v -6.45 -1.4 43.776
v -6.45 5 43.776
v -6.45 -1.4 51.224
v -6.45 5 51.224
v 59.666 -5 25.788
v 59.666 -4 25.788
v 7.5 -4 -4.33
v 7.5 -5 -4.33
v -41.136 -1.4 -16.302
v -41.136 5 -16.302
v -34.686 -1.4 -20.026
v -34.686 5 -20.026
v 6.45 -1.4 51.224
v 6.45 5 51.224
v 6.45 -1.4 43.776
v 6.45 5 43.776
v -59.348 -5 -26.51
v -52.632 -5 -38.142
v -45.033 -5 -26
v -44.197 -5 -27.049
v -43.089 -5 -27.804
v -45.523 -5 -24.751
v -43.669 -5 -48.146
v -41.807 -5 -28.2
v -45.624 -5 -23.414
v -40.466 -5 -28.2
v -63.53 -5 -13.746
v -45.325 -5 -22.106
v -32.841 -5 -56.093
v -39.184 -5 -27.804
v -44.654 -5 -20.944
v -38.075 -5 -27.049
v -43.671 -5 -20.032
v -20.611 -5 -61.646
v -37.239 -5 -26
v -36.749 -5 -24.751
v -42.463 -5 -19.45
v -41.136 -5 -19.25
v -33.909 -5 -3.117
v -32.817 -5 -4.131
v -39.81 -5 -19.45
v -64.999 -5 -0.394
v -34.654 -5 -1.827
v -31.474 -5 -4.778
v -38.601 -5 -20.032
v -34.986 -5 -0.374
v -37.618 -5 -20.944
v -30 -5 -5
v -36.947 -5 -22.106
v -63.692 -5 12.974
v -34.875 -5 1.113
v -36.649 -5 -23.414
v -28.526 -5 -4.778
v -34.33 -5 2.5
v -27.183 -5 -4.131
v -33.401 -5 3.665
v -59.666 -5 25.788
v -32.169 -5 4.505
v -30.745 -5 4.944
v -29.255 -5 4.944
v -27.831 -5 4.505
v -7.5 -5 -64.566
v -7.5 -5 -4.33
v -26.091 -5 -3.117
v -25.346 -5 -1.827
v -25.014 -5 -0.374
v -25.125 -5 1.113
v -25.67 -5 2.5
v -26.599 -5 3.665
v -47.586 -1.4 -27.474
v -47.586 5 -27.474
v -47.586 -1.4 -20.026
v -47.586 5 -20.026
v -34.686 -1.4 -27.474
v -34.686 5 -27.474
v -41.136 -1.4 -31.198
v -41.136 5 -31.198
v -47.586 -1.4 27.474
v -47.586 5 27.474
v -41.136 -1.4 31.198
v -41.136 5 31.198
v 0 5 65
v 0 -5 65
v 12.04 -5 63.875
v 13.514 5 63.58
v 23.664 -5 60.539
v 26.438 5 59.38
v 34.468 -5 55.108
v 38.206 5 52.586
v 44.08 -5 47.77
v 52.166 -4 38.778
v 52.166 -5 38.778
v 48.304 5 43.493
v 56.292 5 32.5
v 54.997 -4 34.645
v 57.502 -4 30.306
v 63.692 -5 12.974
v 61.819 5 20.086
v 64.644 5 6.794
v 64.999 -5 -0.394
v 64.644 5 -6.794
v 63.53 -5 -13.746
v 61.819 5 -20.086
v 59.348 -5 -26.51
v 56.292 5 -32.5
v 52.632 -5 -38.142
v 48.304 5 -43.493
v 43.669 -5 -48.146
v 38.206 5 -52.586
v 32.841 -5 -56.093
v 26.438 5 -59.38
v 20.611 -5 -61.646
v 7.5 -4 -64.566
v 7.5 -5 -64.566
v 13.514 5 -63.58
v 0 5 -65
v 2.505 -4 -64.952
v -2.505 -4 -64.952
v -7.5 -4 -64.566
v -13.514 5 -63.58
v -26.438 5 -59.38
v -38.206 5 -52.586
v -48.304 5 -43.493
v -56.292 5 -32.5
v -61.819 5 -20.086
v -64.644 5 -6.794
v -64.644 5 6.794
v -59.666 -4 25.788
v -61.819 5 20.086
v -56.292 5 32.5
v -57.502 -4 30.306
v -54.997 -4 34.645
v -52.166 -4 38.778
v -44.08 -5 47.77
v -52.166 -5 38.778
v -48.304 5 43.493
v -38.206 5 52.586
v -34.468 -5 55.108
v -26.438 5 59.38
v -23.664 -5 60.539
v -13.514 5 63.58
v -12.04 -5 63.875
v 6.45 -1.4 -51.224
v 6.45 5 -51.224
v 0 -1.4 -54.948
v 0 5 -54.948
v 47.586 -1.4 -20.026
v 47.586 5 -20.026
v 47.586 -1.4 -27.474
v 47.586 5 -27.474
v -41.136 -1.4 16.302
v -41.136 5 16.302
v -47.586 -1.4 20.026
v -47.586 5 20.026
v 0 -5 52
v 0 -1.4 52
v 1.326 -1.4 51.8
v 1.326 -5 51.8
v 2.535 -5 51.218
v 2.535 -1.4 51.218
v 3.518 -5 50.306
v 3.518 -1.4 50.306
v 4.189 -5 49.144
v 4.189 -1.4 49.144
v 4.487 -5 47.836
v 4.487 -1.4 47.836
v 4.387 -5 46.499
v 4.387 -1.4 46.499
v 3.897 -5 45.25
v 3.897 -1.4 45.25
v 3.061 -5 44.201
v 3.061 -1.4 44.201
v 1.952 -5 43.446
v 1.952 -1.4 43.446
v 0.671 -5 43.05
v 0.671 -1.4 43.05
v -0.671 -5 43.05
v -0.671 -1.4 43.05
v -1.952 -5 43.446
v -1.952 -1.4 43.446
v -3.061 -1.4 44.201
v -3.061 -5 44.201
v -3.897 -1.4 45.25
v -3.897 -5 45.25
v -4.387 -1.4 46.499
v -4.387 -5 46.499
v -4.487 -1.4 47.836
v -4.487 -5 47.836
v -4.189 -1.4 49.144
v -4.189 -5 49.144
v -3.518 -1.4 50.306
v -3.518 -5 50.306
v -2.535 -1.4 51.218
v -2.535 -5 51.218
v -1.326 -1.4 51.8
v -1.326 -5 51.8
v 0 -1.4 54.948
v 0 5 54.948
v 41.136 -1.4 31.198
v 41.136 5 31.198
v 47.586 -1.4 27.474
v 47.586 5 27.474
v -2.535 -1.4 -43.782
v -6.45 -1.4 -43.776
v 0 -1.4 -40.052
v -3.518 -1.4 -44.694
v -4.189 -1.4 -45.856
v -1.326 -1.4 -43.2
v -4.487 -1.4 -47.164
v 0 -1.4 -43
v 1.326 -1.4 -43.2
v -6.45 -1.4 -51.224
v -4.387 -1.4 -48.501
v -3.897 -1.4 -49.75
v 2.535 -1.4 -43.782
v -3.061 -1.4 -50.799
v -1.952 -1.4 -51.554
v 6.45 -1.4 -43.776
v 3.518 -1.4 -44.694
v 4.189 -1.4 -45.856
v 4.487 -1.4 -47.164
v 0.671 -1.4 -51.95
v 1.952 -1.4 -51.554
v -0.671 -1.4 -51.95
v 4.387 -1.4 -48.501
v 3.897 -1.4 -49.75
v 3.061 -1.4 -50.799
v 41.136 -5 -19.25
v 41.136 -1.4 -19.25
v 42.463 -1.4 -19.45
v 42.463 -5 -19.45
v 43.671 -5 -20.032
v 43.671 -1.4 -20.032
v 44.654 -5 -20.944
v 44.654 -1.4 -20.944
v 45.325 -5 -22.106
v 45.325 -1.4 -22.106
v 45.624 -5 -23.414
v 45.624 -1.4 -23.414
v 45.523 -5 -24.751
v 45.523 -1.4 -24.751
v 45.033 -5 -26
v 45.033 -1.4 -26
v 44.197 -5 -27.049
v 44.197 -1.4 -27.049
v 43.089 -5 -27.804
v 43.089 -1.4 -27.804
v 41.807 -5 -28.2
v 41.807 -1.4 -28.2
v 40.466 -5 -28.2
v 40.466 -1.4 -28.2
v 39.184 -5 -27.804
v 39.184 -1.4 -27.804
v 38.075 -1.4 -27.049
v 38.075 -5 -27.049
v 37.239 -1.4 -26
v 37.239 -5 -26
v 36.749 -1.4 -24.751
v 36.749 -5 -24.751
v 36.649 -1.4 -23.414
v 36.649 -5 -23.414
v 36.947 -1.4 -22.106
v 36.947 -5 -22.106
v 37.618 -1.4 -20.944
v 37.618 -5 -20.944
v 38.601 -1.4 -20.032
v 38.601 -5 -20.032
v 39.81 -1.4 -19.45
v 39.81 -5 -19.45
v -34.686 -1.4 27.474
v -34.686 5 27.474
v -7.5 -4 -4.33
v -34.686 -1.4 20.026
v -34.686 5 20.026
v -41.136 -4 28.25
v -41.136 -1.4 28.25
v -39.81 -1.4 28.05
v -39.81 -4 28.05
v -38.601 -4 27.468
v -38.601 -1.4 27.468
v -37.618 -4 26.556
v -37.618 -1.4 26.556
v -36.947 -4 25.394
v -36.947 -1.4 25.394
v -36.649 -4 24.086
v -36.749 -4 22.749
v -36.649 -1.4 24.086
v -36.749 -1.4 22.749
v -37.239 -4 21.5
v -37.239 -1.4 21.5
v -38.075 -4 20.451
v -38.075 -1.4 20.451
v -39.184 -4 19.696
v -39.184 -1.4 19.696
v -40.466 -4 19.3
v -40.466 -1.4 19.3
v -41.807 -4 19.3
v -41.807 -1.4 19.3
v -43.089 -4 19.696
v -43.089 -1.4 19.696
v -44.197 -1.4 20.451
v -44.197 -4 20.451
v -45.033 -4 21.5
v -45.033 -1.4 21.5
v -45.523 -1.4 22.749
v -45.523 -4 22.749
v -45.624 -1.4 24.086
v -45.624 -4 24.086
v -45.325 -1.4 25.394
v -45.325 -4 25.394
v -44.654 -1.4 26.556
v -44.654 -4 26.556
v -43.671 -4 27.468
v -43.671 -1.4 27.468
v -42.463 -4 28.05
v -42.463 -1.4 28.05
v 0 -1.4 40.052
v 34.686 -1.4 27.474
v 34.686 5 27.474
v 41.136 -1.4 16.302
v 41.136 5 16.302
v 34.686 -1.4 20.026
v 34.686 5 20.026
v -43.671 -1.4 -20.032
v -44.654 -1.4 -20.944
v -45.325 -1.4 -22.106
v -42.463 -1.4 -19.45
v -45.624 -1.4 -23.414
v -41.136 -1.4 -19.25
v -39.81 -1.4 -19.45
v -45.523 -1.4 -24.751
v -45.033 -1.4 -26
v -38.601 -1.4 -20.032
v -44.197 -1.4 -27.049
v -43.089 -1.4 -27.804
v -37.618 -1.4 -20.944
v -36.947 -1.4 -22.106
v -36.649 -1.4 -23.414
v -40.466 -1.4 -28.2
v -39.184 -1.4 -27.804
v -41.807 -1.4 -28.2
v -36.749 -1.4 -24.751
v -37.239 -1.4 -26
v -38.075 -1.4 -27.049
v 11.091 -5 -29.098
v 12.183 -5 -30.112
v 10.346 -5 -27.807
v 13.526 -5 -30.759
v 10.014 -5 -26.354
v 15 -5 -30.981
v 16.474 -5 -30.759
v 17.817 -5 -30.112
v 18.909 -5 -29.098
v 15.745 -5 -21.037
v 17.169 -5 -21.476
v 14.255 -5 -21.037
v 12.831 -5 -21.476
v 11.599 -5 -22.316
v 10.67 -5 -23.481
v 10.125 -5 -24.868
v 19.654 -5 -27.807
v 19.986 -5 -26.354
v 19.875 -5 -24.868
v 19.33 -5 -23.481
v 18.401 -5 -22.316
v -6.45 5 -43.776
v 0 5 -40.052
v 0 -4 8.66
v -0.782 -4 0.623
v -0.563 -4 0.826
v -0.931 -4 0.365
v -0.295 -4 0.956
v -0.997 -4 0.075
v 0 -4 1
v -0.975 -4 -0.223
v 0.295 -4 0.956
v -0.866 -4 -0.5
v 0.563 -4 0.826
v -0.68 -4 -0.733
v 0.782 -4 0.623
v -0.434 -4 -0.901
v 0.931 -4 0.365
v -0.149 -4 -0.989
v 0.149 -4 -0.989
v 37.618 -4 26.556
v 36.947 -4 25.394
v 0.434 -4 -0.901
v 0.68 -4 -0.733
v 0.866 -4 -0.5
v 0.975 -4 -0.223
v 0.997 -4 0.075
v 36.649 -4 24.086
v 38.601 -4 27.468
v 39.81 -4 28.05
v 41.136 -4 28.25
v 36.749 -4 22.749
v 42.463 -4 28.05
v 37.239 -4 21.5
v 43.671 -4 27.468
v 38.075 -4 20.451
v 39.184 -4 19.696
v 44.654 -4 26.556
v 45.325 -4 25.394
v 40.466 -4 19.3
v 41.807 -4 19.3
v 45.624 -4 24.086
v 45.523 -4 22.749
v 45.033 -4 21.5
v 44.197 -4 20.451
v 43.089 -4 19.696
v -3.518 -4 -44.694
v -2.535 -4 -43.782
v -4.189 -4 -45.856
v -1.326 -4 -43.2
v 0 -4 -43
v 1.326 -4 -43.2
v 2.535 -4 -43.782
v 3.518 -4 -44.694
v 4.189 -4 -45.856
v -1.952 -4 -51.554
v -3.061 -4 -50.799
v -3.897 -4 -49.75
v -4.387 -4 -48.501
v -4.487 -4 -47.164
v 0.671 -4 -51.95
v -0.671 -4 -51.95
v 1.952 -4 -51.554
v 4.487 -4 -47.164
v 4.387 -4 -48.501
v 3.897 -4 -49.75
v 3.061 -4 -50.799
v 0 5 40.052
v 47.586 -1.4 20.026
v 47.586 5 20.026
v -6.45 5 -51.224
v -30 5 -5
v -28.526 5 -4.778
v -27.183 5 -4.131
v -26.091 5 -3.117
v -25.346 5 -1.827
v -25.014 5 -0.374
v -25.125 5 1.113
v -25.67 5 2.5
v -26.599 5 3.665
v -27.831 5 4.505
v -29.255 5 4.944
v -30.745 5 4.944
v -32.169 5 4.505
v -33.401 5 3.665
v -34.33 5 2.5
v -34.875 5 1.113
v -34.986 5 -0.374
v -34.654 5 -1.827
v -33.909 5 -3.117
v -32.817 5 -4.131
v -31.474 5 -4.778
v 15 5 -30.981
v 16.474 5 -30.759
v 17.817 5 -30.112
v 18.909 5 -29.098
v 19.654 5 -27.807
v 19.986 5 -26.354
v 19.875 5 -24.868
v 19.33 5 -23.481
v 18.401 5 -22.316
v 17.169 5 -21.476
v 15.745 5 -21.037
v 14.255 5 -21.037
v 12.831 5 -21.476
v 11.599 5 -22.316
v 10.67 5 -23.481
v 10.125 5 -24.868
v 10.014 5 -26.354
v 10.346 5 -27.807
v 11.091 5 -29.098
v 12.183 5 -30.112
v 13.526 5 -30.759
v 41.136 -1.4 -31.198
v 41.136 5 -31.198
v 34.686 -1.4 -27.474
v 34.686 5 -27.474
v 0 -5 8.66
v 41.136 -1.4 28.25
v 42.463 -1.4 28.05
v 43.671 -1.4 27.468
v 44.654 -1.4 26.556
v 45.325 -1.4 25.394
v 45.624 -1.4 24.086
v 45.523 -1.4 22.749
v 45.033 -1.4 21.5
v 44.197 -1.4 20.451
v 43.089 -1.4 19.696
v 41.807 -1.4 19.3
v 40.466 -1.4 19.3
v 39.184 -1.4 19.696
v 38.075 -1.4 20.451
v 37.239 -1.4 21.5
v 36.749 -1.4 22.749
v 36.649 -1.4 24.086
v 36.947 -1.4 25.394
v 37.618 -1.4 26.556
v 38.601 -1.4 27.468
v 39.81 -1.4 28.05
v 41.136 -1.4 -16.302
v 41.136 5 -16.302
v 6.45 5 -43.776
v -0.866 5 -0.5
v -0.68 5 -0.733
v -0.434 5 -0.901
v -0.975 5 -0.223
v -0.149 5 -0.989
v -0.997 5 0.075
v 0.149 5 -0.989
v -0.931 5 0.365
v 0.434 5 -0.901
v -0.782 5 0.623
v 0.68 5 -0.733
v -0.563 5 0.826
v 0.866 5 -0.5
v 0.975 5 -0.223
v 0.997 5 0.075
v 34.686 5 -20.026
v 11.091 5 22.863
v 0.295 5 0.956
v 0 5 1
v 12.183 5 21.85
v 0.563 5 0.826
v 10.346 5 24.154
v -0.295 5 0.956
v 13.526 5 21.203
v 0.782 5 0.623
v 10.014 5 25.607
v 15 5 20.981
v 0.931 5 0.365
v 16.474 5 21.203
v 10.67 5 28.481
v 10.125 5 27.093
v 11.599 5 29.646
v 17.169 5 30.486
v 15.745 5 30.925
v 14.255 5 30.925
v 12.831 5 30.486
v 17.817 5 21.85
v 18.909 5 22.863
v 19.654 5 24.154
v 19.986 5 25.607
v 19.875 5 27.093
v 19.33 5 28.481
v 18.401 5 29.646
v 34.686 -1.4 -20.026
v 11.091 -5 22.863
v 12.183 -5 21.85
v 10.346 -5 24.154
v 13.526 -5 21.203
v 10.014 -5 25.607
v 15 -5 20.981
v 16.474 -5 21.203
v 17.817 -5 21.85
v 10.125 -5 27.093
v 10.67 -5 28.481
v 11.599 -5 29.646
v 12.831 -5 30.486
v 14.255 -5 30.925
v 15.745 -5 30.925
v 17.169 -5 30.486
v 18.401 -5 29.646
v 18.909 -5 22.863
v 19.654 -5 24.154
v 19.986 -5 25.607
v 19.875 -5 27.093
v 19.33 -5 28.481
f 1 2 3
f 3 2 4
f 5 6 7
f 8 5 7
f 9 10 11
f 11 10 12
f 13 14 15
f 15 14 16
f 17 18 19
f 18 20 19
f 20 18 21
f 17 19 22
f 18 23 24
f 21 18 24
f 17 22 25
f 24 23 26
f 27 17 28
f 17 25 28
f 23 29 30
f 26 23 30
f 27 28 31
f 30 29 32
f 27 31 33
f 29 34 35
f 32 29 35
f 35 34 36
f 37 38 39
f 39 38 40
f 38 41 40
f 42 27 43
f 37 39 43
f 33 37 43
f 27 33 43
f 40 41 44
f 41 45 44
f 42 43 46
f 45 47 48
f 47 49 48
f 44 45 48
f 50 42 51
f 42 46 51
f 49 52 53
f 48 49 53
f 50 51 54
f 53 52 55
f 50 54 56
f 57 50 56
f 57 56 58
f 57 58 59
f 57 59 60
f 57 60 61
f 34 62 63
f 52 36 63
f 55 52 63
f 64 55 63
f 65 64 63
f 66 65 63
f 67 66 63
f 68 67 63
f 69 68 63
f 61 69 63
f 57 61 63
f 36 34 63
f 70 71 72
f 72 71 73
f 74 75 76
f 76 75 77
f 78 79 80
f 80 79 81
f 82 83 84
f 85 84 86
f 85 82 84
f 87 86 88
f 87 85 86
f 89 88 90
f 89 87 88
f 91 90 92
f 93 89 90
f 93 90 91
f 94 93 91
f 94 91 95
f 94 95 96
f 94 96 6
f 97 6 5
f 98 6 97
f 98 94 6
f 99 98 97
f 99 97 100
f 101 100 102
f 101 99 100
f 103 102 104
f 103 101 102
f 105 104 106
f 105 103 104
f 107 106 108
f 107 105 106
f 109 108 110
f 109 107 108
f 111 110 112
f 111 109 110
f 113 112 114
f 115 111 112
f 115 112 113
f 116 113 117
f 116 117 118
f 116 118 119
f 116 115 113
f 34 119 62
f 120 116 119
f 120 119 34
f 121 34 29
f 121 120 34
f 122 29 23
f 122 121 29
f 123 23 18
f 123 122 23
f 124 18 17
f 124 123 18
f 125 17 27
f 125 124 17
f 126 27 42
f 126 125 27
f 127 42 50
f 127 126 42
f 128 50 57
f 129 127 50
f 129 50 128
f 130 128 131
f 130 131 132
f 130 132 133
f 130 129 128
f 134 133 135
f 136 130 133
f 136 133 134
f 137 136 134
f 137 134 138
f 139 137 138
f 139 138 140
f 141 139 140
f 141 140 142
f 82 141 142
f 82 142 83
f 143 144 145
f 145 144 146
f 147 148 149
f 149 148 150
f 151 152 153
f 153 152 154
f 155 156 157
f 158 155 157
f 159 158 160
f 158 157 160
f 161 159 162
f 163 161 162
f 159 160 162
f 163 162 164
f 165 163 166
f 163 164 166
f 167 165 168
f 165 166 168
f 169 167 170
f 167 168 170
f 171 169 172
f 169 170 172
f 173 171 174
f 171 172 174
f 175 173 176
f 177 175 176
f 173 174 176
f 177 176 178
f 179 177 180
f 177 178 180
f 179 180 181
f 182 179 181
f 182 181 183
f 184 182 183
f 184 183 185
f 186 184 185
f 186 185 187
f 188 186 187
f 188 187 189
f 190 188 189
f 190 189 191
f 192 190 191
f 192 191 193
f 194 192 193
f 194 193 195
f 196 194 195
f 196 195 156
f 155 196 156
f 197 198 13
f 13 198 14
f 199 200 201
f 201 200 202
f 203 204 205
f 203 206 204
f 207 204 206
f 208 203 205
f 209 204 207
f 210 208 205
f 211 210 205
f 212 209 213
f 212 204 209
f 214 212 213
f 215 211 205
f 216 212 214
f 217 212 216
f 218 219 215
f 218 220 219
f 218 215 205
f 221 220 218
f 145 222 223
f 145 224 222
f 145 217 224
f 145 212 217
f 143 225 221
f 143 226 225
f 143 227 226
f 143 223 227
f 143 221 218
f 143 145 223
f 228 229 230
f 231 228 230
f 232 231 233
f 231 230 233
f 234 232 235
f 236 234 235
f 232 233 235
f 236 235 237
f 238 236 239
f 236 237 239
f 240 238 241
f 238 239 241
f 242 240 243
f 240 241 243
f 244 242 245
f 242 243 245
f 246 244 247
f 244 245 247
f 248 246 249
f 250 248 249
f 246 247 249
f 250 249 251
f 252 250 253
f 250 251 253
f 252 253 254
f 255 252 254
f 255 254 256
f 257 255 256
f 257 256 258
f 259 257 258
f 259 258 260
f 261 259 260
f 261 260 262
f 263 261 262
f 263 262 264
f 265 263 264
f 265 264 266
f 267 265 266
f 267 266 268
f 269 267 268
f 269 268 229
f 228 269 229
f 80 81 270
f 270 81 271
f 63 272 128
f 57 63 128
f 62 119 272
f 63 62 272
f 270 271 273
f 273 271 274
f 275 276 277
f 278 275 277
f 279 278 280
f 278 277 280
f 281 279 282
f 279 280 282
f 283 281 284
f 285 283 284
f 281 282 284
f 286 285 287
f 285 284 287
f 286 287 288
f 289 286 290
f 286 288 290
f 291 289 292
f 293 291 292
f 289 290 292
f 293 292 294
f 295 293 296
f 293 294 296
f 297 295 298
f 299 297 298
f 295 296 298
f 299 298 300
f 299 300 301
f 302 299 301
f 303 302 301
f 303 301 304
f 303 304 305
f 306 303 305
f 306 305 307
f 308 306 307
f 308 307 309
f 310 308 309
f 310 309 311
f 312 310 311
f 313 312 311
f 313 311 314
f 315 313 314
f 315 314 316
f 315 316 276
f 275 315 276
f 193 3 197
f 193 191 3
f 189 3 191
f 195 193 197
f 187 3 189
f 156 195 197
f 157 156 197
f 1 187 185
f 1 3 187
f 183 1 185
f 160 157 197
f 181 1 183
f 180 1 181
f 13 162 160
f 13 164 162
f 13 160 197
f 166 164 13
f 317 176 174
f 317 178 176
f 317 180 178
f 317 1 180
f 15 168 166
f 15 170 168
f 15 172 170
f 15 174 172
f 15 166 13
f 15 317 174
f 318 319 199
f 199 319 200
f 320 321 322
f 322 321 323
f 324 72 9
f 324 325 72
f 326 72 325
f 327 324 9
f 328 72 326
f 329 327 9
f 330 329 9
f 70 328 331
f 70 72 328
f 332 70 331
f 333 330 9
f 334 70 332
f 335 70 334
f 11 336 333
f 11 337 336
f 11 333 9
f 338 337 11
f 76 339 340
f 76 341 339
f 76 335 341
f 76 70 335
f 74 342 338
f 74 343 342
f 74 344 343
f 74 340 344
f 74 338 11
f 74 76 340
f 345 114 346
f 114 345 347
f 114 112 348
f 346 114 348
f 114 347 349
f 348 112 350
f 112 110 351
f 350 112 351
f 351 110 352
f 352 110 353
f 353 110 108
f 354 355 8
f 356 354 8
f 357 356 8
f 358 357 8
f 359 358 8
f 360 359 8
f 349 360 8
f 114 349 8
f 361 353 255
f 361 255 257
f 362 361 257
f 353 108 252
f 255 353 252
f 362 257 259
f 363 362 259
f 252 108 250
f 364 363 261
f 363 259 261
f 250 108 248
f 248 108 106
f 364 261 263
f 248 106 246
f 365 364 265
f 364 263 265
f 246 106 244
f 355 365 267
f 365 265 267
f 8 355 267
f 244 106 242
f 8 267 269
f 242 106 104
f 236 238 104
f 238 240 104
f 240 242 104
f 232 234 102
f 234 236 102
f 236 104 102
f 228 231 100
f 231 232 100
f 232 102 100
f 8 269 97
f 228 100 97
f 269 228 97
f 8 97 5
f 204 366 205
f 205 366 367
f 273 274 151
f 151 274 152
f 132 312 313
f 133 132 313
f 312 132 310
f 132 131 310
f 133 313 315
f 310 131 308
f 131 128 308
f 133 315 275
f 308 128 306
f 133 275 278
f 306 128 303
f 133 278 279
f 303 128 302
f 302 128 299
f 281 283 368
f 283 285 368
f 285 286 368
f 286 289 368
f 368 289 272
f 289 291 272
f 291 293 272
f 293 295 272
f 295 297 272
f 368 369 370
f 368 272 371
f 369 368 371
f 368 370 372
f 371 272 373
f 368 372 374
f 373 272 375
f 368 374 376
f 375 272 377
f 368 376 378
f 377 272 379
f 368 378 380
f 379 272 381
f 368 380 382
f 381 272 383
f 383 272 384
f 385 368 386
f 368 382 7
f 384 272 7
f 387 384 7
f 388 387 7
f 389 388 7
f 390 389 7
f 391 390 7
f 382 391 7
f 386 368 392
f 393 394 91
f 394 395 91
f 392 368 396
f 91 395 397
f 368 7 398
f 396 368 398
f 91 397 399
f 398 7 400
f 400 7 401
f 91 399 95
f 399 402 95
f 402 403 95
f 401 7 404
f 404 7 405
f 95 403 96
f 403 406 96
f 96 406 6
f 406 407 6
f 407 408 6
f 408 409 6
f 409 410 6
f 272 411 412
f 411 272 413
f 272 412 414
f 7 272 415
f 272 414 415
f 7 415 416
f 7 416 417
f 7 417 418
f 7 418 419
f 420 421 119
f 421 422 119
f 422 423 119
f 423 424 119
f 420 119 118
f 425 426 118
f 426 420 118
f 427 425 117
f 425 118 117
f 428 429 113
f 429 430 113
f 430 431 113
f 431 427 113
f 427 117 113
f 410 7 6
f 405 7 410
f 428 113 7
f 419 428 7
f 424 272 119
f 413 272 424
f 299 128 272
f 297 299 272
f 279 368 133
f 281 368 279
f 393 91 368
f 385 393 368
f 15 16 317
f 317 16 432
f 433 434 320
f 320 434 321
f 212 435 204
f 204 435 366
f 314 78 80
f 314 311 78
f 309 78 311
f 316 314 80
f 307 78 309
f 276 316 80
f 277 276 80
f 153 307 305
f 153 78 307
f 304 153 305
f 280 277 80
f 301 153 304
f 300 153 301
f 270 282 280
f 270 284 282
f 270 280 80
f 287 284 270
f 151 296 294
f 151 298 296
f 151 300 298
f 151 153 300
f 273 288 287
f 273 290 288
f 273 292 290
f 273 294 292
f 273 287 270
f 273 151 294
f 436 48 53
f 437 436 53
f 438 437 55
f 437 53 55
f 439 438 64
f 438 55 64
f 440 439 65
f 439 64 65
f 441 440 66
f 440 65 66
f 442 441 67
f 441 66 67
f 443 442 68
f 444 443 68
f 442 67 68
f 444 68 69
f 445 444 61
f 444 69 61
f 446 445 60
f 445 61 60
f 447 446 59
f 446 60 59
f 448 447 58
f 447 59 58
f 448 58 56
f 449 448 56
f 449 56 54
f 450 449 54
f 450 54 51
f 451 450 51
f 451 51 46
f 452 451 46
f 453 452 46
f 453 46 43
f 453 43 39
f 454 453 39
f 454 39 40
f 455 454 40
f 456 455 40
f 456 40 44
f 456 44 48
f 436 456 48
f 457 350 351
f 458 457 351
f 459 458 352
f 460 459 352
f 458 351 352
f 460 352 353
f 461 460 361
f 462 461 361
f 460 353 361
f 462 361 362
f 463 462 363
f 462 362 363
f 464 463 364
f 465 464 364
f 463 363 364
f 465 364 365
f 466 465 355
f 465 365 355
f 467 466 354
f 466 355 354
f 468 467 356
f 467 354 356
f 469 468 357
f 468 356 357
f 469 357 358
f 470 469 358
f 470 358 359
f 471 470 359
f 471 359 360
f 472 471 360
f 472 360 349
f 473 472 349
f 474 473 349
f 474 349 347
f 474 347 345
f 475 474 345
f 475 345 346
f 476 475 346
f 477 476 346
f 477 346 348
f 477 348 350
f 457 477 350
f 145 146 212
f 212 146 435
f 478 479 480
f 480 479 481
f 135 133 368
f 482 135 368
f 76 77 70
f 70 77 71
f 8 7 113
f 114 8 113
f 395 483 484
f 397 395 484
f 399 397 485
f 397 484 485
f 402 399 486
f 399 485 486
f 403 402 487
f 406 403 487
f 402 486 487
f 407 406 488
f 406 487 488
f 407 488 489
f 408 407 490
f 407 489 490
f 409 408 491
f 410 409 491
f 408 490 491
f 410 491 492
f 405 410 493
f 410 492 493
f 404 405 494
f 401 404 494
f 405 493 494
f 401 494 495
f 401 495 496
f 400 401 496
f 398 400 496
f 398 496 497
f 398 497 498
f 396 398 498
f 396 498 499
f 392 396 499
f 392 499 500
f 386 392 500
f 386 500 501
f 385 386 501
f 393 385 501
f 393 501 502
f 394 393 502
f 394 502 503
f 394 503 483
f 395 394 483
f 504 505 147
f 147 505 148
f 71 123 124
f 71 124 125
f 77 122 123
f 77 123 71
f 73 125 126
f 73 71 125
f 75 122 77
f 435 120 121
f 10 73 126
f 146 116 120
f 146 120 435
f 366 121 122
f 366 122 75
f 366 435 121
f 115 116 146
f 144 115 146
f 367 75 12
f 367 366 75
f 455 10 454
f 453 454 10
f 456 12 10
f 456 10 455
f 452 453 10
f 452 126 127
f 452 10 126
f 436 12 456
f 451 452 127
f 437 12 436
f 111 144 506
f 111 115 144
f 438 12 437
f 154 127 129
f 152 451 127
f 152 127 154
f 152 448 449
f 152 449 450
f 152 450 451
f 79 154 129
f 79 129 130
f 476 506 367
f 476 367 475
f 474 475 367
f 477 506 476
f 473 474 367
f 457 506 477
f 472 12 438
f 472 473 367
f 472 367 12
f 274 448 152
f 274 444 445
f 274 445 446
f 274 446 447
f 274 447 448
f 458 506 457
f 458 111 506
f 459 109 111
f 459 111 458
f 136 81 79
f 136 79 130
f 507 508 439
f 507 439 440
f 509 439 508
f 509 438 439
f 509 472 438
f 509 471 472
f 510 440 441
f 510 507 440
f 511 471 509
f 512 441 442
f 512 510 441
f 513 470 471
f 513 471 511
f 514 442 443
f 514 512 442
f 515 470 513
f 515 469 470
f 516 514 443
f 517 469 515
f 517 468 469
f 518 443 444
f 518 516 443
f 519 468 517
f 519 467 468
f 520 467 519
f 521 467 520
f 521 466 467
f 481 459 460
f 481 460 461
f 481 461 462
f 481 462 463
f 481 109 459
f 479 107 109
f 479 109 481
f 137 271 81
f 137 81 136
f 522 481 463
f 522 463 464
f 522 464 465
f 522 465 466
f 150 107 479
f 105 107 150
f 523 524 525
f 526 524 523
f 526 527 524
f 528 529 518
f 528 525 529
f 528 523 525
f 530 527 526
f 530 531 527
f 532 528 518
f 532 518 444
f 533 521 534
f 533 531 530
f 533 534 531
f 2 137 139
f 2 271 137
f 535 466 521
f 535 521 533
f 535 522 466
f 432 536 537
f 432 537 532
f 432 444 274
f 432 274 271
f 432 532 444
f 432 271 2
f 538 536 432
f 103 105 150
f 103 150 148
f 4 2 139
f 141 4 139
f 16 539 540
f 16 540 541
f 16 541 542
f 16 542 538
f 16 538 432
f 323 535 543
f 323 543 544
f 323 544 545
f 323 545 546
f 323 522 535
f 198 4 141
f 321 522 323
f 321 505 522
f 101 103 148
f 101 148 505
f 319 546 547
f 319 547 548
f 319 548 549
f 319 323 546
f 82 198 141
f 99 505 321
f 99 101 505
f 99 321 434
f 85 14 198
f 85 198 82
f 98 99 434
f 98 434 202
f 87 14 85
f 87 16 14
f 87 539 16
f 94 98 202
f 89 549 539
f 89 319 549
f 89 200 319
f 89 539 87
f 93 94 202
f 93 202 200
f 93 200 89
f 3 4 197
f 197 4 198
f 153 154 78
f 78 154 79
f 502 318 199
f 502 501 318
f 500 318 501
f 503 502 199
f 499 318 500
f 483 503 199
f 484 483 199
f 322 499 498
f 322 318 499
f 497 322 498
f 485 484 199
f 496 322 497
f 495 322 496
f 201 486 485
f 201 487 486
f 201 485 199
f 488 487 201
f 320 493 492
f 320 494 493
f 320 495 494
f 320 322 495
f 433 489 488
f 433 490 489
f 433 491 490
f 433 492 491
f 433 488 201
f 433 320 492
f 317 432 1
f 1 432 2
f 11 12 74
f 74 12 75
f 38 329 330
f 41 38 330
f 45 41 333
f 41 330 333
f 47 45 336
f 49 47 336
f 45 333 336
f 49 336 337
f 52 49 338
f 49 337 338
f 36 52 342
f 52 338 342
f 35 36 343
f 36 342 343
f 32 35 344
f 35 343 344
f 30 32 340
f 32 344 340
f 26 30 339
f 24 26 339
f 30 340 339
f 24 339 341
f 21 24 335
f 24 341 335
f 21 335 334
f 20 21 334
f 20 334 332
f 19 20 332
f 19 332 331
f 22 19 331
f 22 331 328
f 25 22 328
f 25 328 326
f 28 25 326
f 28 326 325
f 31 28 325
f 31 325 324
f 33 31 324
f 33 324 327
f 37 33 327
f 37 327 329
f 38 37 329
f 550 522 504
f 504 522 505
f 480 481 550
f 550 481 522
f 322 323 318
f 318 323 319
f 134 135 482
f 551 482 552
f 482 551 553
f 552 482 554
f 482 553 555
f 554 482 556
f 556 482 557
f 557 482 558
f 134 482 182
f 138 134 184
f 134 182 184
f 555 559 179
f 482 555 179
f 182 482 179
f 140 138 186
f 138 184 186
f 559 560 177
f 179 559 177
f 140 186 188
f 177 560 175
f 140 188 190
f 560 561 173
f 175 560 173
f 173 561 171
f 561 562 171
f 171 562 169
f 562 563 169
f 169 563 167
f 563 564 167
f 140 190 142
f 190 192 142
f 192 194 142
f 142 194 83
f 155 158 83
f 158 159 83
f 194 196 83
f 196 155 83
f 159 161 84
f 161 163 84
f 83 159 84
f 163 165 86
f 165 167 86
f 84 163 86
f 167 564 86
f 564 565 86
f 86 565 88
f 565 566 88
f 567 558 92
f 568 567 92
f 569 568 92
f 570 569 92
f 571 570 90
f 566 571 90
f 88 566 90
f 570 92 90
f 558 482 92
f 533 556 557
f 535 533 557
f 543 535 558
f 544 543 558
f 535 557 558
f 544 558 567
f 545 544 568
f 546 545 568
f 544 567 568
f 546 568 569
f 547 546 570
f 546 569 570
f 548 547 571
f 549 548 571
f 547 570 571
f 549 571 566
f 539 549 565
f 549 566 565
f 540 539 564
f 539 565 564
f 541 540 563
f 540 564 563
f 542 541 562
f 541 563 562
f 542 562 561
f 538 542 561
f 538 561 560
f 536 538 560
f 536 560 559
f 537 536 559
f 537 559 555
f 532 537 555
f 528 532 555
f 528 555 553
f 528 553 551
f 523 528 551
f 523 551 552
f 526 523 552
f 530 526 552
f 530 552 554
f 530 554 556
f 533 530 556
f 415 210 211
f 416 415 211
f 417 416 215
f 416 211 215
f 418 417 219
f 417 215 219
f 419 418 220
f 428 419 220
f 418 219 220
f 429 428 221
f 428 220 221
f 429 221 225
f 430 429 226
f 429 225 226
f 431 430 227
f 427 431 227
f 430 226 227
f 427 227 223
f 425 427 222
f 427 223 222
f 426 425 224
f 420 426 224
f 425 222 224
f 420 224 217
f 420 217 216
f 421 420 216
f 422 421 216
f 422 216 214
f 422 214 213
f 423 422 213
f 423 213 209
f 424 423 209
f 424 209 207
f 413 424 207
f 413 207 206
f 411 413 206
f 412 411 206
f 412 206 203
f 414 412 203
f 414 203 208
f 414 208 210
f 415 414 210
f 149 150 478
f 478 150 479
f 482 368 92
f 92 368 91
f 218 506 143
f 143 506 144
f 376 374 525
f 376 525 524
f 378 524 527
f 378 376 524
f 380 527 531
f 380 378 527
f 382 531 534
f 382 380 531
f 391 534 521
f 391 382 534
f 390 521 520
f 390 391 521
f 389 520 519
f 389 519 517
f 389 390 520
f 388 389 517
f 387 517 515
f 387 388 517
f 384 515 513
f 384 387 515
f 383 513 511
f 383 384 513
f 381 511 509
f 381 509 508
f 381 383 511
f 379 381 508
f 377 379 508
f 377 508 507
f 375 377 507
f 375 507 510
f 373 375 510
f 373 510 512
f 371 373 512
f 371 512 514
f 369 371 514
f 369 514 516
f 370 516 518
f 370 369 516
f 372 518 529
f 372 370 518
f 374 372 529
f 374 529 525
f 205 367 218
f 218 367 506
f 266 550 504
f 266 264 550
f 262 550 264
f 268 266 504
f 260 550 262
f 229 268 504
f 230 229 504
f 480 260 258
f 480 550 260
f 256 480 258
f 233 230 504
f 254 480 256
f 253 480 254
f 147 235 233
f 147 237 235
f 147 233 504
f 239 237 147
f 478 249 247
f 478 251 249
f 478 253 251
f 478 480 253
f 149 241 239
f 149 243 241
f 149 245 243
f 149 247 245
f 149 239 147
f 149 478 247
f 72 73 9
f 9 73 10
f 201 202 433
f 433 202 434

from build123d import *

# Parameters (mm, degrees)
SKETCH1_R           = 65
SKETCH1_R_2         = 1
BOSS_EXTRUDE1_DEPTH = 5
CUT_EXTRUDE1_DEPTH  = 6.4
SKETCH4_R           = 4.5
CUT_EXTRUDE2_DEPTH  = 93.146405247
CUT_EXTRUDE3_START  = -9
CUT_EXTRUDE3_DEPTH  = 3
SKETCH6_R           = 5
CUT_EXTRUDE4_DEPTH  = 93.466210045


with BuildPart() as part:
    # Sketch1 → Boss-Extrude1 (new, symmetric)
    with BuildSketch(Plane(origin=(0, 0, 0), x_dir=(1, 0, 0), z_dir=(0, 1, 0))):
        with Locations(Location((0, 0, 0), (0, 0, 270))):
            Circle(SKETCH1_R)
        with Locations(Location((0, 0, 0), (0, 0, 270))):
            Circle(SKETCH1_R_2, mode=Mode.SUBTRACT)
    extrude(amount=BOSS_EXTRUDE1_DEPTH, both=True)

    # Sketch3 → Cut-Extrude1 (cut)
    with BuildSketch(Plane(origin=(0, 5, 0), x_dir=(1, 0, 0), z_dir=(0, 1, 0))):
        Polygon((34.68620668, 20.026090764), (41.13620668, 16.302181527), (47.58620668, 20.026090764), (47.58620668, 27.473909236), (41.13620668, 31.197818473), (34.68620668, 27.473909236), align=None)
        Polygon((0, 40.052181527), (6.45, 43.776090764), (6.45, 51.223909236), (0, 54.947818473), (-6.45, 51.223909236), (-6.45, 43.776090764), align=None)
        Polygon((34.68620668, -20.026090764), (34.68620668, -27.473909236), (41.13620668, -31.197818473), (47.58620668, -27.473909236), (47.58620668, -20.026090764), (41.13620668, -16.302181527), align=None)
        Polygon((0, -40.052181527), (-6.45, -43.776090764), (-6.45, -51.223909236), (0, -54.947818473), (6.45, -51.223909236), (6.45, -43.776090764), align=None)
        Polygon((-34.68620668, -20.026090764), (-41.13620668, -16.302181527), (-47.58620668, -20.026090764), (-47.58620668, -27.473909236), (-41.13620668, -31.197818473), (-34.68620668, -27.473909236), align=None)
        Polygon((-34.68620668, 20.026090764), (-34.68620668, 27.473909236), (-41.13620668, 31.197818473), (-47.58620668, 27.473909236), (-47.58620668, 20.026090764), (-41.13620668, 16.302181527), align=None)
    extrude(amount=-CUT_EXTRUDE1_DEPTH, mode=Mode.SUBTRACT)

    # Sketch4 → Cut-Extrude2 (cut, through all)
    with BuildSketch(Plane(origin=(0, -1.4, 0), x_dir=(1, 0, 0), z_dir=(0, 1, 0))):
        with Locations(Location((0, 47.5, 0), (0, 0, 270))):
            Circle(SKETCH4_R)
        with Locations(Location((41.13620668, 23.75, 0), (0, 0, 270))):
            Circle(SKETCH4_R)
        with Locations(Location((41.13620668, -23.75, 0), (0, 0, 270))):
            Circle(SKETCH4_R)
        with Locations(Location((0, -47.5, 0), (0, 0, 270))):
            Circle(SKETCH4_R)
        with Locations(Location((-41.13620668, -23.75, 0), (0, 0, 270))):
            Circle(SKETCH4_R)
        with Locations(Location((-41.13620668, 23.75, 0), (0, 0, 270))):
            Circle(SKETCH4_R)
    extrude(amount=-CUT_EXTRUDE2_DEPTH, mode=Mode.SUBTRACT)

    # Sketch5 → Cut-Extrude3 (cut)
    with BuildSketch(Plane(origin=(0, 5, 0), x_dir=(1, 0, 0), z_dir=(0, 1, 0)).offset(CUT_EXTRUDE3_START)):
        Polygon((60.463542815, -26.248388682), (7.5, 4.330127019), (7.5, 65.487158421), (-7.5, 65.487158421), (-7.5, 4.330127019), (-60.463542815, -26.248388682), (-52.963542815, -39.238769739), (0, -8.660254038), (52.963542815, -39.238769739), align=None)
    extrude(amount=-CUT_EXTRUDE3_DEPTH, mode=Mode.SUBTRACT)

    # Sketch6 → Cut-Extrude4 (cut, through all)
    with BuildSketch(Plane.XZ.offset(5)):
        with Locations(Location((-30, 0, 0), (0, 0, 270))):
            Circle(SKETCH6_R)
        with Locations(Location((15, 25.980762114, 0), (0, 0, 270))):
            Circle(SKETCH6_R)
        with Locations(Location((15, -25.980762114, 0), (0, 0, 270))):
            Circle(SKETCH6_R)
    extrude(amount=-CUT_EXTRUDE4_DEPTH, mode=Mode.SUBTRACT)


solid = part.part
